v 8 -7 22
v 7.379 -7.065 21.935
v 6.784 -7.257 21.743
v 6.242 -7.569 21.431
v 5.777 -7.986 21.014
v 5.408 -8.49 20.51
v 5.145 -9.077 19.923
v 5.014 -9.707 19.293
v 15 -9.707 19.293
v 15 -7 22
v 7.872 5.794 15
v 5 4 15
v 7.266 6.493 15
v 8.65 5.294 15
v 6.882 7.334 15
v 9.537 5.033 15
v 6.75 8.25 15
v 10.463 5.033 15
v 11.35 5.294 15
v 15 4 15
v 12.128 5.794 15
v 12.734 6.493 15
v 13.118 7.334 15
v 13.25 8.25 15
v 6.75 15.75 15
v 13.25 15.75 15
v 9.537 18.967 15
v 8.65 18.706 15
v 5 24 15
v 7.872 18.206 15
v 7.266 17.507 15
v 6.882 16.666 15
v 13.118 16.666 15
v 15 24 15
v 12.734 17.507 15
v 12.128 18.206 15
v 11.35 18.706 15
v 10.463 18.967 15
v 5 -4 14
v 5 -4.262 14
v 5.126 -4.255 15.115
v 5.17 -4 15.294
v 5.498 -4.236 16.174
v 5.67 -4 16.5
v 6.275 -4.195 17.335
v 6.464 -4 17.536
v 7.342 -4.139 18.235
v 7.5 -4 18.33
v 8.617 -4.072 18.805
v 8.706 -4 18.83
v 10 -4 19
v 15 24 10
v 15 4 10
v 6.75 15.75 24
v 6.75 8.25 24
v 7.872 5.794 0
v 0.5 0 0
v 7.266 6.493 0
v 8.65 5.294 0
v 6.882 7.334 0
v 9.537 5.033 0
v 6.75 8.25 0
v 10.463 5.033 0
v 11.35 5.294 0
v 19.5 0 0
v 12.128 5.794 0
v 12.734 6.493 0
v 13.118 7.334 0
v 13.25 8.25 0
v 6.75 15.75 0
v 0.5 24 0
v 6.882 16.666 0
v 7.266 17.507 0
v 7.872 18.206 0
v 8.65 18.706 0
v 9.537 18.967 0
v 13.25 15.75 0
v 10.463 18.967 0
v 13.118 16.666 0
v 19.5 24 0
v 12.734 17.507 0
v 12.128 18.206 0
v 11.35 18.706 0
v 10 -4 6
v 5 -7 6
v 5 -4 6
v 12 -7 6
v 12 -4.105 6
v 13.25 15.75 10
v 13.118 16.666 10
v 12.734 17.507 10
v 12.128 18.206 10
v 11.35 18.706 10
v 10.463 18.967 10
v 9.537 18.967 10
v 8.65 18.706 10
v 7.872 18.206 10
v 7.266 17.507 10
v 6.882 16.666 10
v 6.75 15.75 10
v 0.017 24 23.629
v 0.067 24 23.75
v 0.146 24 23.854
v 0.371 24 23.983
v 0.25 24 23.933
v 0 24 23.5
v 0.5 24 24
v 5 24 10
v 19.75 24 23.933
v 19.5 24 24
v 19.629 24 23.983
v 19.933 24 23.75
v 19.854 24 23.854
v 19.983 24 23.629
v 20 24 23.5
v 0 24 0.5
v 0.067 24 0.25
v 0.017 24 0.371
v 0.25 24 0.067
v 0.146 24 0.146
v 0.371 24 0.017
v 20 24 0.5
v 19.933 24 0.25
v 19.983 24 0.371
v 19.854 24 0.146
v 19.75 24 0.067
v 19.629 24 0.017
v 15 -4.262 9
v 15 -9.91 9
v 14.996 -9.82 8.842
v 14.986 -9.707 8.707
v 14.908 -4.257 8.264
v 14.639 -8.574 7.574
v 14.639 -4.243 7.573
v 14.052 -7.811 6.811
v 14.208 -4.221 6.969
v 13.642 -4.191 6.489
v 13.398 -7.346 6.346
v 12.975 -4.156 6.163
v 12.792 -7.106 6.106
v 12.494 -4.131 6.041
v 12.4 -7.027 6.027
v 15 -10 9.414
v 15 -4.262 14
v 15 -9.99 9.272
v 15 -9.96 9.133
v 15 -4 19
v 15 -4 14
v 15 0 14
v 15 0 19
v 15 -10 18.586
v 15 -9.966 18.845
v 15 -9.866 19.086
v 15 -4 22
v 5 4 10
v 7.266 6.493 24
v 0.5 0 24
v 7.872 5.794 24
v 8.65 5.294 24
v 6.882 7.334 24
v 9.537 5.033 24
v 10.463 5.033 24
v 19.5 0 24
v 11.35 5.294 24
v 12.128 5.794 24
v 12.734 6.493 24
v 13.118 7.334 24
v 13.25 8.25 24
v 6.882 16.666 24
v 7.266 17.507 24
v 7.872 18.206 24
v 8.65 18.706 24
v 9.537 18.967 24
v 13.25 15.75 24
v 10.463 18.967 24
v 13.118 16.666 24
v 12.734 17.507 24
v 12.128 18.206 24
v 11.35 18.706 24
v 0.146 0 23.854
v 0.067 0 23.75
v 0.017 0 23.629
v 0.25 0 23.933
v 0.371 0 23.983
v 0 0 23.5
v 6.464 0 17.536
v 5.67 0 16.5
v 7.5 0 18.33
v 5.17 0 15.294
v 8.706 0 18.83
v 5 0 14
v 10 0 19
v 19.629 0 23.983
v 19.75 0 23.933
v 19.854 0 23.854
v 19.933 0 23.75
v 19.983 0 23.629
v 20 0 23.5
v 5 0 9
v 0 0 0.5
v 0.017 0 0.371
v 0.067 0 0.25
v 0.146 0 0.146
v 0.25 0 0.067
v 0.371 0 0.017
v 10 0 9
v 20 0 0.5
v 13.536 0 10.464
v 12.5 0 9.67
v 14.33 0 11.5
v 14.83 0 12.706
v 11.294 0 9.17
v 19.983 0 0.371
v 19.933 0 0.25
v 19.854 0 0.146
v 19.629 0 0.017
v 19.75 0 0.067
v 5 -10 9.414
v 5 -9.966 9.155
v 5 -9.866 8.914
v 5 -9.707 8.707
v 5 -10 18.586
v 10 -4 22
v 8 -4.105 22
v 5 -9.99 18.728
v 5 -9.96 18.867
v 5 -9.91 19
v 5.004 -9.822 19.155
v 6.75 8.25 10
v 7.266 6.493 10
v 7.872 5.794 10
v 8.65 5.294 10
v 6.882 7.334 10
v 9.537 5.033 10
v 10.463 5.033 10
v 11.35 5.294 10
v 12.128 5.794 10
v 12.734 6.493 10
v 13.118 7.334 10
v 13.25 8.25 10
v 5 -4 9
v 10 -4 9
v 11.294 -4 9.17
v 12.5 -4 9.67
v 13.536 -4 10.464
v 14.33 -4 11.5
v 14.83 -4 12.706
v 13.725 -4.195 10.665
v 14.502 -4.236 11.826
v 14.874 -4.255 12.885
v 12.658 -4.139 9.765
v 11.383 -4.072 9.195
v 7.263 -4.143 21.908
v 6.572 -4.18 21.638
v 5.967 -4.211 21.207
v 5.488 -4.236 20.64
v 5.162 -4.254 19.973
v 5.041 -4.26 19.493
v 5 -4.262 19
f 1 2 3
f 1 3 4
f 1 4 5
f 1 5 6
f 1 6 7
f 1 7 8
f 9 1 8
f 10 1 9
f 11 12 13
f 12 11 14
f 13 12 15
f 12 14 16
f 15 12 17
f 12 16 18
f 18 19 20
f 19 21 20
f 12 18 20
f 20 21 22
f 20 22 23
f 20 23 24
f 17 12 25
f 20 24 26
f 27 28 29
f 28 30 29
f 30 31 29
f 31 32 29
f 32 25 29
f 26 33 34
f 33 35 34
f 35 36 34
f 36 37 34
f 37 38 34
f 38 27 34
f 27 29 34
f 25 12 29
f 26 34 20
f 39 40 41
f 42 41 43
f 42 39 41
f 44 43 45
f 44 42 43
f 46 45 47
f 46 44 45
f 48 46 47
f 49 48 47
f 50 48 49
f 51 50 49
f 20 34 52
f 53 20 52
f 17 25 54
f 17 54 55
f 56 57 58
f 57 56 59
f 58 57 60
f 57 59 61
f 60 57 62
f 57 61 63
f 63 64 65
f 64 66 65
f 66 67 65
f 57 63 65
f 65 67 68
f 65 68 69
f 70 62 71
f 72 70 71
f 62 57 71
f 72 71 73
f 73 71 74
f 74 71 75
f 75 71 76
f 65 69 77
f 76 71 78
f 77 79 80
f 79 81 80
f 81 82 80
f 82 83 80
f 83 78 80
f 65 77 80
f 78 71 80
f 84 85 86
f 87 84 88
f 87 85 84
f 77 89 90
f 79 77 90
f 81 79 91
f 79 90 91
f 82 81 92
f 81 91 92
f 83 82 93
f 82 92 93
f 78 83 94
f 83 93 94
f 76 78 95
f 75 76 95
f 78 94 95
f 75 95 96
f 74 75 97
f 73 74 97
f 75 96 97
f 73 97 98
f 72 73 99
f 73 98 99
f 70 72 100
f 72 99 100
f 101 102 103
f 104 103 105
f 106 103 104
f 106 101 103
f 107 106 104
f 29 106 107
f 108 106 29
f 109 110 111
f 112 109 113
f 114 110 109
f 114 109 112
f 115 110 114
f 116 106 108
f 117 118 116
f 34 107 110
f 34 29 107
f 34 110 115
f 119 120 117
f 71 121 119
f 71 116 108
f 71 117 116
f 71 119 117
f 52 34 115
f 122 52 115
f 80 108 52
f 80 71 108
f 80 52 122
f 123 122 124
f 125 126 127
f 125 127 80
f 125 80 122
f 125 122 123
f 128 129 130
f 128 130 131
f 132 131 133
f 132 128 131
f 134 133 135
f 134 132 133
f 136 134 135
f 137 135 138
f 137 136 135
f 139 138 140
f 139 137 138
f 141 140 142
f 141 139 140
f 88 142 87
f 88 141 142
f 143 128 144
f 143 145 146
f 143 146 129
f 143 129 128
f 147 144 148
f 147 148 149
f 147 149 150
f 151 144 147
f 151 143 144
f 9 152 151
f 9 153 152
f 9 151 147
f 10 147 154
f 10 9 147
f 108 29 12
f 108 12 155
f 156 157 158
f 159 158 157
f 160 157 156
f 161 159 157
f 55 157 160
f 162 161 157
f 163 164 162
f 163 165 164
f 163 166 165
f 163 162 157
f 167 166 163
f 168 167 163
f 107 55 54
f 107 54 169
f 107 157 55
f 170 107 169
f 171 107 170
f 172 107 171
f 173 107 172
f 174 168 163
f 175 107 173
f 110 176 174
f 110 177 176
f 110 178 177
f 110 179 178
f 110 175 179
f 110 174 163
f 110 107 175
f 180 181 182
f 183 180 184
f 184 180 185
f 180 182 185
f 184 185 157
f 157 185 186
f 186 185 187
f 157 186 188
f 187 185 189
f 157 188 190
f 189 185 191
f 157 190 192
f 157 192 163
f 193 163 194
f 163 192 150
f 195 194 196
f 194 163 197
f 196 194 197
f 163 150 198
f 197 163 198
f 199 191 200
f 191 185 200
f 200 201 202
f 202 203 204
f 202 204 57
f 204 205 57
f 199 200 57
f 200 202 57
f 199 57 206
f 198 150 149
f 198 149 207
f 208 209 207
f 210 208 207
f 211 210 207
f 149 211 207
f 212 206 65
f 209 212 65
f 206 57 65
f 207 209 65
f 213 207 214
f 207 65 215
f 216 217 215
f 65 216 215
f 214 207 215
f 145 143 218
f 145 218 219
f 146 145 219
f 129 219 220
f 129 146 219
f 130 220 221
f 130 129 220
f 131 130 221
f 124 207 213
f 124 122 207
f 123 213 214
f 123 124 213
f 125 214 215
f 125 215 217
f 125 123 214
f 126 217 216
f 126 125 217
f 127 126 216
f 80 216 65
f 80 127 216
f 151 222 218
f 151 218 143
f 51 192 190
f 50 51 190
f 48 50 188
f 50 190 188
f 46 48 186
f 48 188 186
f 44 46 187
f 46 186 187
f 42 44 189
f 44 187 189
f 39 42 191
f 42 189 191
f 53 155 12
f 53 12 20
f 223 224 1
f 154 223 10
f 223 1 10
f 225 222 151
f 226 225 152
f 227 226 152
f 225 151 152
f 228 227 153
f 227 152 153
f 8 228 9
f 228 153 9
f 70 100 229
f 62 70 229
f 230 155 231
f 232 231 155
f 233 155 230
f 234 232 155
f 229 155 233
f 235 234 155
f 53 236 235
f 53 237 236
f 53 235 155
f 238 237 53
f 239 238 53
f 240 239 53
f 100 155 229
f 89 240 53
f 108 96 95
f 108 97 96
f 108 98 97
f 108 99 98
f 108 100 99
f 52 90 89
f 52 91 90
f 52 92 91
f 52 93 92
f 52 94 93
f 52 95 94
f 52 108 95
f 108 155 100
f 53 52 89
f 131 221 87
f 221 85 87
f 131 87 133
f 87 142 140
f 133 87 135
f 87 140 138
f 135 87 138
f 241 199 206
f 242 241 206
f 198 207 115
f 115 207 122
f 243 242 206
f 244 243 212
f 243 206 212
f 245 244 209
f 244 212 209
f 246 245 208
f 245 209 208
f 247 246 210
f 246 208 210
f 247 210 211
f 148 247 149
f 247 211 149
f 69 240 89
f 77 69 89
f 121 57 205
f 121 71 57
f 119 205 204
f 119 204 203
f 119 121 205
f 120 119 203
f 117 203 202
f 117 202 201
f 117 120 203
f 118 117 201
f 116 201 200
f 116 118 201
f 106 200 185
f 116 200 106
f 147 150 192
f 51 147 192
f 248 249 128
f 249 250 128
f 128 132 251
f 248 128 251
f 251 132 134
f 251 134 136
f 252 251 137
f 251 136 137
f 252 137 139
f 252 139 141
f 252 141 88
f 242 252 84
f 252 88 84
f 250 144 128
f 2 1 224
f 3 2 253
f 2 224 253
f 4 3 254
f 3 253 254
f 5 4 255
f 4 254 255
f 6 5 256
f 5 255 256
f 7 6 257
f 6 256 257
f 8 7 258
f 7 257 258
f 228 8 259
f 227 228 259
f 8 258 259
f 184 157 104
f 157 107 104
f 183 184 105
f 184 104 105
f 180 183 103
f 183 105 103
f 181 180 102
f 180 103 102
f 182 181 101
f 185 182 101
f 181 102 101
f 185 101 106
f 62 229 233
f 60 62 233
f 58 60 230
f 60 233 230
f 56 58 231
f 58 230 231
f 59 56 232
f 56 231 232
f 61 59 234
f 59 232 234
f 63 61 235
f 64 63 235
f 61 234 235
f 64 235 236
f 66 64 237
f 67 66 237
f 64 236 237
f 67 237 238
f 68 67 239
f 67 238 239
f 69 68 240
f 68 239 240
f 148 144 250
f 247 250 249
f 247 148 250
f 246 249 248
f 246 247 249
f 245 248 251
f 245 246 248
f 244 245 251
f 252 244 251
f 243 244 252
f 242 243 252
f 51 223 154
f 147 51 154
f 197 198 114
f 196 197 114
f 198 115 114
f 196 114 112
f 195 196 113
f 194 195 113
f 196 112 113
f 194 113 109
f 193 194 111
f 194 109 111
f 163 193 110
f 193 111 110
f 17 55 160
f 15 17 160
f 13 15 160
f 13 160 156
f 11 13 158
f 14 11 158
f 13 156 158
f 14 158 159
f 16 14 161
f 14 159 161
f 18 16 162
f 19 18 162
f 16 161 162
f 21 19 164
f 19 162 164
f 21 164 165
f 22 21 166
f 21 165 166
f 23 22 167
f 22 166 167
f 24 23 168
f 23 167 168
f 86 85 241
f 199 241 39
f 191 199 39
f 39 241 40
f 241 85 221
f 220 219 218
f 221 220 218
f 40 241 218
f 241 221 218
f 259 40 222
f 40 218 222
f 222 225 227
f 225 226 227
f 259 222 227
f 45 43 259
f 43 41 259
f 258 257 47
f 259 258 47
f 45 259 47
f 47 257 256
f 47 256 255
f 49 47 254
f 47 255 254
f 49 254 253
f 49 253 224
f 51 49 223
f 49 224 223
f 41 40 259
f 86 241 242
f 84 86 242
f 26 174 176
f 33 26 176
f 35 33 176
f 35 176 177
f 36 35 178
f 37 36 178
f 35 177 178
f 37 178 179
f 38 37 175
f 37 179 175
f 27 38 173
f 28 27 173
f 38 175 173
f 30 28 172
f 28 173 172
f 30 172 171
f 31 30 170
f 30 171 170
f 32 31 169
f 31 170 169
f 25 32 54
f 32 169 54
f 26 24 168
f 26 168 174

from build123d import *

# Parameters (mm, degrees)
SKETCH_1_W               = 20
SKETCH_1_H               = 24
EXTRUDE_1_DEPTH          = 24
CUT_EXTRUDE_1_DEPTH      = 24
SKETCH_3_W               = 10
SKETCH_3_H               = 5
CUT_EXTRUDE_2_DEPTH      = 20
EXTRUDE_2_DEPTH          = 10
SKETCH_5_W               = 10
SKETCH_5_H               = 16
EXTRUDE_3_DEPTH          = 6
FILLET_2_R               = 0.5
CHAMFER_3_SIZE           = 3
CHAMFER_4_SIZE           = 3
FILLET_3_R               = 1
CUT_EXTRUDE_3_REACH      = 24
CUT_EXTRUDE_3_END_RADIUS = 5
CUT_EXTRUDE_4_REACH      = 20
CUT_EXTRUDE_4_END_RADIUS = 5
FILLET_6_R               = 3
FILLET_7_R               = 3


with BuildPart() as part:
    # 草图1 → 拉伸1 (new body)
    with BuildSketch(Plane.XY):
        with Locations((10, 12)):
            Rectangle(SKETCH_1_W, SKETCH_1_H)
    extrude(amount=EXTRUDE_1_DEPTH)

    # 草图2 → 切除-拉伸1 (cut)
    with BuildSketch(Plane.XY.offset(24)):
        with BuildLine():
            Line((6.75, 15.75), (6.75, 8.25))
            ThreePointArc((6.75, 8.25), (10, 5), (13.25, 8.25))
            Line((13.25, 8.25), (13.25, 15.75))
            ThreePointArc((13.25, 15.75), (10, 19), (6.75, 15.75))
        make_face()
    extrude(amount=-CUT_EXTRUDE_1_DEPTH, mode=Mode.SUBTRACT)

    # 草图3 → 切除-拉伸2 (cut)
    with BuildSketch(Plane(origin=(0, 24, 0), x_dir=(1, 0, 0), z_dir=(0, 1, 0))):
        with Locations((10, -12.5)):
            Rectangle(SKETCH_3_W, SKETCH_3_H)
    extrude(amount=-CUT_EXTRUDE_2_DEPTH, mode=Mode.SUBTRACT)

    # 草图4 → 拉伸2 (add)
    with BuildSketch(Plane.XZ):
        with BuildLine():
            Line((15, 19), (10, 19))
            ThreePointArc((10, 19), (6.464466094, 17.535533906), (5, 14))
            Line((5, 14), (5, 9))
            Line((5, 9), (10, 9))
            ThreePointArc((10, 9), (13.535533906, 10.464466094), (15, 14))
            Line((15, 14), (15, 19))
        make_face()
    extrude(amount=EXTRUDE_2_DEPTH)

    # 草图5 → 拉伸3 (add)
    with BuildSketch(Plane.XZ.offset(10)):
        with Locations((10, 14)):
            Rectangle(SKETCH_5_W, SKETCH_5_H)
    extrude(amount=-EXTRUDE_3_DEPTH)

    # 圆角2
    fillet_2_edges = [part.edges().sort_by_distance(p)[0] for p in [
        (20, 12, 24),
        (0, 12, 24),
        (20, 12, 0),
        (0, 12, 0),
    ]]
    fillet(fillet_2_edges, radius=FILLET_2_R)

    # 倒角3
    chamfer_3_edges = [part.edges().sort_by_distance(p)[0] for p in [
        (10, -10, 22),
    ]]
    chamfer(chamfer_3_edges, length=CHAMFER_3_SIZE)

    # 倒角4
    chamfer_4_edges = [part.edges().sort_by_distance(p)[0] for p in [
        (10, -10, 6),
    ]]
    chamfer(chamfer_4_edges, length=CHAMFER_4_SIZE)

    # 圆角3
    fillet_3_edges = [part.edges().sort_by_distance(p)[0] for p in [
        (10, -10, 19),
        (10, -10, 9),
    ]]
    fillet(fillet_3_edges, radius=FILLET_3_R)

    # 切除-拉伸3: up to this cylinder (the profile starts outside it)
    cut_extrude_3_end = Plane(origin=(10, -4.087346, 14), z_dir=(0, 1, 0)) * Cylinder(CUT_EXTRUDE_3_END_RADIUS, 59, mode=Mode.PRIVATE)
    # 草图8 → 切除-拉伸3 (cut, up to the surface)
    with BuildSketch(Plane.XY.offset(22), mode=Mode.PRIVATE) as cut_extrude_3_sk1:
        Polygon((10, -4), (5, -4), (5, -4.262038896), align=None)
    cut_extrude_3_tool1 = extrude(cut_extrude_3_sk1.sketch, amount=-CUT_EXTRUDE_3_REACH, mode=Mode.PRIVATE) - cut_extrude_3_end
    add(cut_extrude_3_tool1.solids().sort_by_distance((6.666667, -4.087346, 22))[0], mode=Mode.SUBTRACT)

    # 切除-拉伸4: up to this cylinder (the profile starts outside it)
    cut_extrude_4_end = Plane(origin=(10, -4.087346, 14), z_dir=(0, 1, 0)) * Cylinder(CUT_EXTRUDE_4_END_RADIUS, 51, mode=Mode.PRIVATE)
    # 草图9 → 切除-拉伸4 (cut, up to the surface)
    with BuildSketch(Plane(origin=(0, 0, 6), x_dir=(-1, 0, 0), z_dir=(0, 0, -1)), mode=Mode.PRIVATE) as cut_extrude_4_sk1:
        Polygon((-10, -4), (-15, -4), (-15, -4.262038896), align=None)
    cut_extrude_4_tool1 = extrude(cut_extrude_4_sk1.sketch, amount=-CUT_EXTRUDE_4_REACH, mode=Mode.PRIVATE) - cut_extrude_4_end
    add(cut_extrude_4_tool1.solids().sort_by_distance((13.333333, -4.087346, 6))[0], mode=Mode.SUBTRACT)

    # 圆角6
    fillet_6_edges = [part.edges().sort_by_distance(p)[0] for p in [
        (15, -5.631019448, 6),
    ]]
    fillet(fillet_6_edges, radius=FILLET_6_R)

    # 圆角7
    fillet_7_edges = [part.edges().sort_by_distance(p)[0] for p in [
        (5, -5.631019448, 22),
    ]]
    fillet(fillet_7_edges, radius=FILLET_7_R)


solid = part.part
